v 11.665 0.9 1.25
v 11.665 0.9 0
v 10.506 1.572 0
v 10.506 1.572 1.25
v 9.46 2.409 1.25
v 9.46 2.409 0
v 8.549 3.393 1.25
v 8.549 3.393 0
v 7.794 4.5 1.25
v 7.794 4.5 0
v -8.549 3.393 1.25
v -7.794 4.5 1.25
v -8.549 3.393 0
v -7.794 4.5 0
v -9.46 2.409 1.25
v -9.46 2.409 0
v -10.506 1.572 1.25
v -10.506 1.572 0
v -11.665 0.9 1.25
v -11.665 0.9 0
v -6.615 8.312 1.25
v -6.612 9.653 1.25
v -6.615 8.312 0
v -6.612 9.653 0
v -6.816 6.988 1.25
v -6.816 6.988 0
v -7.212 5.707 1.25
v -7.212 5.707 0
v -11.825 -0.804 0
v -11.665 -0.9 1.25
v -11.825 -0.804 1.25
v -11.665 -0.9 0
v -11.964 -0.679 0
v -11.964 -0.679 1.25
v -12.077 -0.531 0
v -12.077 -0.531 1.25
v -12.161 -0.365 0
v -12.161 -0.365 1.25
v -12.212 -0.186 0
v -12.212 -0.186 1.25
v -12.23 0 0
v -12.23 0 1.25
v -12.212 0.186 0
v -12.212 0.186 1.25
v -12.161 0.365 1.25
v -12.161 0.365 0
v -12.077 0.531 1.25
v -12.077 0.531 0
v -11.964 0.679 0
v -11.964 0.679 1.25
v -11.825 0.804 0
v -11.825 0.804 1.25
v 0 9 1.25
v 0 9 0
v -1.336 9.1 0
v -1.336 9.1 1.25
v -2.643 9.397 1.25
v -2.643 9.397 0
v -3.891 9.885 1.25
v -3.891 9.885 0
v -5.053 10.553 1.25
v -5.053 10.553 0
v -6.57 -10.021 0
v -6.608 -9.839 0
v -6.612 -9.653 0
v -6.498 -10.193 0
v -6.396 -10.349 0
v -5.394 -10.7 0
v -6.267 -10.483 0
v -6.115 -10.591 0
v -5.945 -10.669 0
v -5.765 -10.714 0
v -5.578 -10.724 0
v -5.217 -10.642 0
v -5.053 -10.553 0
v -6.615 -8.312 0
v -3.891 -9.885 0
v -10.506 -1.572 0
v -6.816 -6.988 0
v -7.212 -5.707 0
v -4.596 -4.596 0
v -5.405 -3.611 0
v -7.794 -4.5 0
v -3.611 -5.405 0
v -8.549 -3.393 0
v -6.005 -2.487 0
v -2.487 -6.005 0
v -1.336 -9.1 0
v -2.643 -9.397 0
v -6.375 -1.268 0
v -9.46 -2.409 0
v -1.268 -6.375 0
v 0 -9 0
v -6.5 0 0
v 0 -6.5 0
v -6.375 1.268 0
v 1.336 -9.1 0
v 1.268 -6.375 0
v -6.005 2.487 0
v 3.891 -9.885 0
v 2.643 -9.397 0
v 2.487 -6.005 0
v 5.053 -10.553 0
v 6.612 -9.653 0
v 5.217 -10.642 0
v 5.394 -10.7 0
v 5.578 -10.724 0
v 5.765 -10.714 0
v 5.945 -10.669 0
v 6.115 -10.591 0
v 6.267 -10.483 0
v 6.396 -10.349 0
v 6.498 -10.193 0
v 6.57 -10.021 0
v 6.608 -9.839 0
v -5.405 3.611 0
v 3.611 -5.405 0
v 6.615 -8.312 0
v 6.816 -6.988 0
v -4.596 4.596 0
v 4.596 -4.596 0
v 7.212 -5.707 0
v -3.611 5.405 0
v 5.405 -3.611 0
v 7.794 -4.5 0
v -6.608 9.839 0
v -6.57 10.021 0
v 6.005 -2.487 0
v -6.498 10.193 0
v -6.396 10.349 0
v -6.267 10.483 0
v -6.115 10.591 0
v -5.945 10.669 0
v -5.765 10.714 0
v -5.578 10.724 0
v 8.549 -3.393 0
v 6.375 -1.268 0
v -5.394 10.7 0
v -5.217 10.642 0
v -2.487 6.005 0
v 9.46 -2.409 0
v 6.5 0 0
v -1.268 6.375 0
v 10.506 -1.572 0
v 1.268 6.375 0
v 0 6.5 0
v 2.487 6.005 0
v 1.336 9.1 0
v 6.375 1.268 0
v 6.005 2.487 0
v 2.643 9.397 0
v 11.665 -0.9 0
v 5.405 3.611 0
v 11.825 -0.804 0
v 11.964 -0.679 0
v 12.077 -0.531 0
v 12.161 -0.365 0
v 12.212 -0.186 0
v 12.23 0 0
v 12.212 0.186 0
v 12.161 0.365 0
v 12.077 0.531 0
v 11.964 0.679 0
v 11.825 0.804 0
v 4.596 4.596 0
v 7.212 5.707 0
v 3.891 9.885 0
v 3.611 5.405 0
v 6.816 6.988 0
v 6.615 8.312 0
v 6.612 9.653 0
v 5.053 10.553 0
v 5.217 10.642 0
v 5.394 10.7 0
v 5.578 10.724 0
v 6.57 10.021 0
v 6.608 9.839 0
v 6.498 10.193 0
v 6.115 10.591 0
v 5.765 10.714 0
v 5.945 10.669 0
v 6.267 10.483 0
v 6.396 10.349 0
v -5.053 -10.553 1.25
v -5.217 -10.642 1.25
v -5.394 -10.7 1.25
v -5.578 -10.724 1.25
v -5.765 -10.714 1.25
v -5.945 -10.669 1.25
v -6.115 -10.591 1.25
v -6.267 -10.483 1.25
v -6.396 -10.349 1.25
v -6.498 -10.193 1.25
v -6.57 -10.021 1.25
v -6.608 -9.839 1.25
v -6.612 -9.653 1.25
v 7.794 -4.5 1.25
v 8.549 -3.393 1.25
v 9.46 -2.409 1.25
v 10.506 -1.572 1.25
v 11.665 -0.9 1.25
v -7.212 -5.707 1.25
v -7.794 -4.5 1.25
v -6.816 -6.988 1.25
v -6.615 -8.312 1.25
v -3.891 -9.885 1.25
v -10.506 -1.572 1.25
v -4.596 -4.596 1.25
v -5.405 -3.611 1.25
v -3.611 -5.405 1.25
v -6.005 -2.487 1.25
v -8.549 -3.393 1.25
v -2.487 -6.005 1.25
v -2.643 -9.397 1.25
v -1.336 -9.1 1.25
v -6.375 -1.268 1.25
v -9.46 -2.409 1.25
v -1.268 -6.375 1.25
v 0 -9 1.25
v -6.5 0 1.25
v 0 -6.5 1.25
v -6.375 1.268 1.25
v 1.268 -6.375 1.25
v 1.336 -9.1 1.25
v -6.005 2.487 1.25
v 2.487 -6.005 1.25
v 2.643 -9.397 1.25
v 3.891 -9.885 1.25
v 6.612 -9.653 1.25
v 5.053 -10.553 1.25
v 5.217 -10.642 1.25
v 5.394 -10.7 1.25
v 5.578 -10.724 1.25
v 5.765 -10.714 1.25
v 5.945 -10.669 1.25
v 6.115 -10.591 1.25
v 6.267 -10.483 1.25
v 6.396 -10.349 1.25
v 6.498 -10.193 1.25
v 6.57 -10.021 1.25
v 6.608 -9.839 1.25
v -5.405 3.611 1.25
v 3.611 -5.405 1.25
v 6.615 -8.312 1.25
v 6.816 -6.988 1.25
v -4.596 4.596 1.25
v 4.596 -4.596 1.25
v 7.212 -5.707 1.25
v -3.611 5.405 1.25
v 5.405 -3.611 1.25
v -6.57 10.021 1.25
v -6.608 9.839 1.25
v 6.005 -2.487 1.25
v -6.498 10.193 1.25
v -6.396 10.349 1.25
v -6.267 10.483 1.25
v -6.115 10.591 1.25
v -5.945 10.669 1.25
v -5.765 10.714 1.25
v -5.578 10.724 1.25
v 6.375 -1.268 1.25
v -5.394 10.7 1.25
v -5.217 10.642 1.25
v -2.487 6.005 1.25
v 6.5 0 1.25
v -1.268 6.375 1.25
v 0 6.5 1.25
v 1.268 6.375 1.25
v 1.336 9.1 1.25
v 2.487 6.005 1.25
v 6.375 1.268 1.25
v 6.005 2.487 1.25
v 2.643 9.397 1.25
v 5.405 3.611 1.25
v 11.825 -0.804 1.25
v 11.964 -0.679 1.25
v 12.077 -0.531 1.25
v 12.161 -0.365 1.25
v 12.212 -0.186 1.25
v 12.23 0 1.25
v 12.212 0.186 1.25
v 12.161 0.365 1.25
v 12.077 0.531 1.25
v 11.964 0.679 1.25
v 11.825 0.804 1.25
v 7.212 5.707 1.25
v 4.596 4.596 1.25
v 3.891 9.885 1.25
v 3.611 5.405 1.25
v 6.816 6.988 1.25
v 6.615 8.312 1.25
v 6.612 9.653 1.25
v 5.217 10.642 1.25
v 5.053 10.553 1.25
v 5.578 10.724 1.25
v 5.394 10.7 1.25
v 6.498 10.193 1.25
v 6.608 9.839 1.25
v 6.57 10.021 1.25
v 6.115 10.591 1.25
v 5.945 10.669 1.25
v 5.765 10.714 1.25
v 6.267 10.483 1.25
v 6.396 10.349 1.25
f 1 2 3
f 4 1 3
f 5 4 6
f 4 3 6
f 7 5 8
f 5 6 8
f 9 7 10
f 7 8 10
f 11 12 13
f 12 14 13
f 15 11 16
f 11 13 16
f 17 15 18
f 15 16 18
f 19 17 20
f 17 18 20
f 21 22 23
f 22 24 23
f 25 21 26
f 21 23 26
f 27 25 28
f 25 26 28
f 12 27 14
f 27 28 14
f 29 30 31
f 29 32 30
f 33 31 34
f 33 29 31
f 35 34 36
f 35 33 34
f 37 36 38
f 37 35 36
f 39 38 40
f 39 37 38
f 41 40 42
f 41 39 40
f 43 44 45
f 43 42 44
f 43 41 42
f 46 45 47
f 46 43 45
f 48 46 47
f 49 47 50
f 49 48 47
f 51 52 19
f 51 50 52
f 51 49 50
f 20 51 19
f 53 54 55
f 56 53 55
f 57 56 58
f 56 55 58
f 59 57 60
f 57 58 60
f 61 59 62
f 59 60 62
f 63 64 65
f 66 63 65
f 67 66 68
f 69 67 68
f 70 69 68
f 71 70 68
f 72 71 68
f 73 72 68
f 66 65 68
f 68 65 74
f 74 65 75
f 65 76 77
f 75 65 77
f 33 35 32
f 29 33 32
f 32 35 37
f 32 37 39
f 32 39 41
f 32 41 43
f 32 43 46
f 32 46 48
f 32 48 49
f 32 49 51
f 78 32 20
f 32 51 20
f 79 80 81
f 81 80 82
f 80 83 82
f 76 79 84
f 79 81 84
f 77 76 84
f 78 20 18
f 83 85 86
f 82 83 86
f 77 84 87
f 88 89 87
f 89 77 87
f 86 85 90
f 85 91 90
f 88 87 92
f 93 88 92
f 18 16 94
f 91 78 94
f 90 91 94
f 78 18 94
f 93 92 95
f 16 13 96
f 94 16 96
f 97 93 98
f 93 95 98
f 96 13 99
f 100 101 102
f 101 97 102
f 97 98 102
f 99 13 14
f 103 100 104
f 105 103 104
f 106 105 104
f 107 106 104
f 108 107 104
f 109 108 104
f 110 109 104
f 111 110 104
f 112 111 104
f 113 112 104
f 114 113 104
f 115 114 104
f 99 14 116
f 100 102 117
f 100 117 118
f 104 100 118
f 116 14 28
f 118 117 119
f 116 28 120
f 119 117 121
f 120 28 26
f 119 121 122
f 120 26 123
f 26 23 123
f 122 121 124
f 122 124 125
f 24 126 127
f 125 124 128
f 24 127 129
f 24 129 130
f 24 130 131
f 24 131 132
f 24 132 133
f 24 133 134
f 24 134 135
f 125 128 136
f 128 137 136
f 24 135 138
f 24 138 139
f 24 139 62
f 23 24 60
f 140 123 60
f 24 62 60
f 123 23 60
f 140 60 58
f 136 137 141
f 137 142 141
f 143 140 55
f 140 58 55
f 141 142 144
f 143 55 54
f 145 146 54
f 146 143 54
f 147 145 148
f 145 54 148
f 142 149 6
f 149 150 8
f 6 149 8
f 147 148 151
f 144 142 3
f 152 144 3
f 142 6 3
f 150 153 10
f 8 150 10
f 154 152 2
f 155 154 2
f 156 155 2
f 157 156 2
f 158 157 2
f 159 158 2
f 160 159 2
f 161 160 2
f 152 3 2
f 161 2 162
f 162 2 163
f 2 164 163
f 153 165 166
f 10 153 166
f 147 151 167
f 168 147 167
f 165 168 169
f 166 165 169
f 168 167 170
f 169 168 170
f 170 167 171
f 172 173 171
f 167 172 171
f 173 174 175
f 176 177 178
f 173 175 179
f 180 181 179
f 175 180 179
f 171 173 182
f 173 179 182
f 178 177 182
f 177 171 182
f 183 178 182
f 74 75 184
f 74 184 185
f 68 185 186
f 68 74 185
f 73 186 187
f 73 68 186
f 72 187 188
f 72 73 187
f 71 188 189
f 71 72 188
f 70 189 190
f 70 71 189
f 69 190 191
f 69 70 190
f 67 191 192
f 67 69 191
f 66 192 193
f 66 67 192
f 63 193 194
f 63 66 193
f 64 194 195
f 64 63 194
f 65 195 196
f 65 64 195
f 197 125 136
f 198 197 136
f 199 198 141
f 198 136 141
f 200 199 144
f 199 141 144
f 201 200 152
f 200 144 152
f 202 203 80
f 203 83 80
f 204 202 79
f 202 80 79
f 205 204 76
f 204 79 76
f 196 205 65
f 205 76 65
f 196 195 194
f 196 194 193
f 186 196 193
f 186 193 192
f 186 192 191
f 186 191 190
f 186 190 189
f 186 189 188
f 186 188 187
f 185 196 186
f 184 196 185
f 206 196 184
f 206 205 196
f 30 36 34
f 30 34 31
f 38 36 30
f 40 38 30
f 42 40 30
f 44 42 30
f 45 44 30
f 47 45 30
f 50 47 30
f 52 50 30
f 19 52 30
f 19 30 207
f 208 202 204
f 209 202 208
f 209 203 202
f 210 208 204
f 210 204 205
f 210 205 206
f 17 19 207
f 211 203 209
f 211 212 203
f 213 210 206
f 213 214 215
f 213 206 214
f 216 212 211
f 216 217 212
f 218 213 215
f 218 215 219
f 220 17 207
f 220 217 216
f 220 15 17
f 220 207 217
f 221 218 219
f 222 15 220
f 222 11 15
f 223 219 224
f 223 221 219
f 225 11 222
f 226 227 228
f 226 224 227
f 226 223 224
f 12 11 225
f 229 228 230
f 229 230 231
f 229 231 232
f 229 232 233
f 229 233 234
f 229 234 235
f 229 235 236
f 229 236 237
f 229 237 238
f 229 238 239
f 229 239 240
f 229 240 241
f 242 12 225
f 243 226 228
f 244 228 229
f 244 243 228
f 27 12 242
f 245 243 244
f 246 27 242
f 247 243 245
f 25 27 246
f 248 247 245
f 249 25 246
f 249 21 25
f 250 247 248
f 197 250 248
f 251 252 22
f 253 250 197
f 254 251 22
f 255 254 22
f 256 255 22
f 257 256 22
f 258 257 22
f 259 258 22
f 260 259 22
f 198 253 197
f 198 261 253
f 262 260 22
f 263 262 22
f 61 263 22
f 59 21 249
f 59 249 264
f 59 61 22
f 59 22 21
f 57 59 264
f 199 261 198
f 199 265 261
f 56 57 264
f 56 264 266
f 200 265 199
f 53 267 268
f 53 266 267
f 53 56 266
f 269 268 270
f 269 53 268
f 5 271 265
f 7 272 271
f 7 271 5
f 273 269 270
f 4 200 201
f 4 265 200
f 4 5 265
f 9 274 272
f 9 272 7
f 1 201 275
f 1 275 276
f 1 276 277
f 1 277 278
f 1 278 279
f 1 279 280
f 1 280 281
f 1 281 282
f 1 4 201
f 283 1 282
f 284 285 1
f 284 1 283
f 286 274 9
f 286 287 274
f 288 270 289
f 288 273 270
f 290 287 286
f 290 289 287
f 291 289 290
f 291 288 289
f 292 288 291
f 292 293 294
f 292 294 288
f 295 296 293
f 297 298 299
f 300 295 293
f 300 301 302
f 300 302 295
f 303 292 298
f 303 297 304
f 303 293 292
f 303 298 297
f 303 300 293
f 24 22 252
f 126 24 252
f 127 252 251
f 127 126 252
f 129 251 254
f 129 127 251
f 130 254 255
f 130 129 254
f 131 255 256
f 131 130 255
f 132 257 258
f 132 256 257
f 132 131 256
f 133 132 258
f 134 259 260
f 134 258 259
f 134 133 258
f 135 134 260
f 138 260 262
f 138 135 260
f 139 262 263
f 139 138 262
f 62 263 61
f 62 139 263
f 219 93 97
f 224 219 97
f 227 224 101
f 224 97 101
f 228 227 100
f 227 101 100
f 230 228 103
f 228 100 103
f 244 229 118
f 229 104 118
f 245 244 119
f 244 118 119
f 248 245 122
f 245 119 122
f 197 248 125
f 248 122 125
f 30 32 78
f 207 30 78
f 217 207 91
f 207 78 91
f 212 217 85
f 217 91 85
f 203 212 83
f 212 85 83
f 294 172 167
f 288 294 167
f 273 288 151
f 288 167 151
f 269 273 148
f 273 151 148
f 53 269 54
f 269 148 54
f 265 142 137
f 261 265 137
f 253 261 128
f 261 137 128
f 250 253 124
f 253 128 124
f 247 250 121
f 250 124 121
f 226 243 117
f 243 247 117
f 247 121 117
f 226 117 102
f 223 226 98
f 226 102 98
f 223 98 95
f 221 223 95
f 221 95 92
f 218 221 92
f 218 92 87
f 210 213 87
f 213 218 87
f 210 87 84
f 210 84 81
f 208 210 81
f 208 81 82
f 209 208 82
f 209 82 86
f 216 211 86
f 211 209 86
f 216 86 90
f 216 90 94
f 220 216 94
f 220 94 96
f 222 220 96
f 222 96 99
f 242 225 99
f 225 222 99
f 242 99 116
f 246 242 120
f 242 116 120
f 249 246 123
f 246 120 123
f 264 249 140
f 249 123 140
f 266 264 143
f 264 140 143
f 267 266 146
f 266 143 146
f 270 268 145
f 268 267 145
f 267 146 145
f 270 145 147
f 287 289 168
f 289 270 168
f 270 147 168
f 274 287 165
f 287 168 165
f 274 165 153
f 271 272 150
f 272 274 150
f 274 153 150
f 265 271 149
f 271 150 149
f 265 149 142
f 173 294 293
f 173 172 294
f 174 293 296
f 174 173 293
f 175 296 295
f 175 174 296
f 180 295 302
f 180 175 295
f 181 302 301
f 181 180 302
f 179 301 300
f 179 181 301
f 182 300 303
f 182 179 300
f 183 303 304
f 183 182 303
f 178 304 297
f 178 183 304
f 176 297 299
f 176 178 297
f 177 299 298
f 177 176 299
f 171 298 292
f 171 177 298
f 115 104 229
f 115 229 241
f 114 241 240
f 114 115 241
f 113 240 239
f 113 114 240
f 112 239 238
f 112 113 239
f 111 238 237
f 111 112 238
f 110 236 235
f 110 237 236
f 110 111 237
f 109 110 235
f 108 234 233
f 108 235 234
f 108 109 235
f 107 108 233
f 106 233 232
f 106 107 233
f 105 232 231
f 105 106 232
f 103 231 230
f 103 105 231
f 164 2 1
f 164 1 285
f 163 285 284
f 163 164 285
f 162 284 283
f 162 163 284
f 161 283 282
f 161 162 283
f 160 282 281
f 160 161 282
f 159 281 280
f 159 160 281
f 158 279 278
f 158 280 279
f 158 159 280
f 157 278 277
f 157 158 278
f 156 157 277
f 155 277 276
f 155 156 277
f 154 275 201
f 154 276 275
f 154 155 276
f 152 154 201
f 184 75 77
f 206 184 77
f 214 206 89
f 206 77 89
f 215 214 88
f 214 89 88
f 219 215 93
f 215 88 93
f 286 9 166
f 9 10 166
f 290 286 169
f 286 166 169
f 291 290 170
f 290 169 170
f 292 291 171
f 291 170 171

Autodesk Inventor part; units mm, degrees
ref_plane "YZ Plane" through (0, 0, 0) normal (1, 0, 0) x (0, 1, 0)
ref_plane "XZ Plane" through (0, 0, 0) normal (0, 1, 0) x (-1, 0, 0)
sketch "Sketch1" plane through (0, 0, 0) normal (0, 0, 1) x (1, 0, 0)
  arc A0 (0, 9) -> (-7.7942, 4.5) centre (0, 0) ccw projected
  arc A1 (-5.0533, 10.5526) -> (0, 9) centre (0, 18) ccw projected
  arc A2 (-5.0533, 10.5526) -> (-6.6121, 9.6526) centre (-5.6148, 9.7251) ccw projected
  arc A3 (-7.7942, 4.5) -> (-6.6121, 9.6526) centre (-15.5885, 9) ccw projected
  arc A4 (7.7942, 4.5) -> (0, 9) centre (0, 0) ccw projected
  arc A5 (6.6121, 9.6526) -> (7.7942, 4.5) centre (15.5885, 9) ccw projected
  arc A6 (6.6121, 9.6526) -> (5.0533, 10.5526) centre (5.6148, 9.7251) ccw projected
  arc A7 (0, 9) -> (5.0533, 10.5526) centre (0, 18) ccw projected
  arc A8 (7.7942, -4.5) -> (7.7942, 4.5) centre (0, 0) ccw projected
  arc A9 (11.6654, -0.9) -> (7.7942, -4.5) centre (15.5885, -9) ccw projected
  arc A10 (11.6654, -0.9) -> (11.6654, 0.9) centre (11.2296, 0) ccw projected
  arc A11 (7.7942, 4.5) -> (11.6654, 0.9) centre (15.5885, 9) ccw projected
  arc A12 (0, -9) -> (7.7942, -4.5) centre (0, 0) ccw projected
  arc A13 (5.0533, -10.5526) -> (0, -9) centre (0, -18) ccw projected
  arc A14 (5.0533, -10.5526) -> (6.6121, -9.6526) centre (5.6148, -9.7251) ccw projected
  arc A15 (7.7942, -4.5) -> (6.6121, -9.6526) centre (15.5885, -9) ccw projected
  arc A16 (-7.7942, -4.5) -> (0, -9) centre (0, 0) ccw projected
  arc A17 (-6.6121, -9.6526) -> (-7.7942, -4.5) centre (-15.5885, -9) ccw projected
  arc A18 (-6.6121, -9.6526) -> (-5.0533, -10.5526) centre (-5.6148, -9.7251) ccw projected
  arc A19 (0, -9) -> (-5.0533, -10.5526) centre (0, -18) ccw projected
  arc A20 (-7.7942, 4.5) -> (-7.7942, -4.5) centre (0, 0) ccw projected
  arc A21 (-11.6654, 0.9) -> (-7.7942, 4.5) centre (-15.5885, 9) ccw projected
  arc A22 (-11.6654, 0.9) -> (-11.6654, -0.9) centre (-11.2296, 0) ccw projected
  arc A23 (-7.7942, -4.5) -> (-11.6654, -0.9) centre (-15.5885, -9) ccw projected
  circle A24 centre (0, 0) radius 6.5
  point P0 (0, 0)
ref_plane "Work Plane1" through (-9, -9, 1.25) normal (0, 0, 1) x (1, 0, 0)
extrude "Extrusion1" add sketch "Sketch1" along normal up to surface (1.25 mm away)
properties part number "piece-fixer"
